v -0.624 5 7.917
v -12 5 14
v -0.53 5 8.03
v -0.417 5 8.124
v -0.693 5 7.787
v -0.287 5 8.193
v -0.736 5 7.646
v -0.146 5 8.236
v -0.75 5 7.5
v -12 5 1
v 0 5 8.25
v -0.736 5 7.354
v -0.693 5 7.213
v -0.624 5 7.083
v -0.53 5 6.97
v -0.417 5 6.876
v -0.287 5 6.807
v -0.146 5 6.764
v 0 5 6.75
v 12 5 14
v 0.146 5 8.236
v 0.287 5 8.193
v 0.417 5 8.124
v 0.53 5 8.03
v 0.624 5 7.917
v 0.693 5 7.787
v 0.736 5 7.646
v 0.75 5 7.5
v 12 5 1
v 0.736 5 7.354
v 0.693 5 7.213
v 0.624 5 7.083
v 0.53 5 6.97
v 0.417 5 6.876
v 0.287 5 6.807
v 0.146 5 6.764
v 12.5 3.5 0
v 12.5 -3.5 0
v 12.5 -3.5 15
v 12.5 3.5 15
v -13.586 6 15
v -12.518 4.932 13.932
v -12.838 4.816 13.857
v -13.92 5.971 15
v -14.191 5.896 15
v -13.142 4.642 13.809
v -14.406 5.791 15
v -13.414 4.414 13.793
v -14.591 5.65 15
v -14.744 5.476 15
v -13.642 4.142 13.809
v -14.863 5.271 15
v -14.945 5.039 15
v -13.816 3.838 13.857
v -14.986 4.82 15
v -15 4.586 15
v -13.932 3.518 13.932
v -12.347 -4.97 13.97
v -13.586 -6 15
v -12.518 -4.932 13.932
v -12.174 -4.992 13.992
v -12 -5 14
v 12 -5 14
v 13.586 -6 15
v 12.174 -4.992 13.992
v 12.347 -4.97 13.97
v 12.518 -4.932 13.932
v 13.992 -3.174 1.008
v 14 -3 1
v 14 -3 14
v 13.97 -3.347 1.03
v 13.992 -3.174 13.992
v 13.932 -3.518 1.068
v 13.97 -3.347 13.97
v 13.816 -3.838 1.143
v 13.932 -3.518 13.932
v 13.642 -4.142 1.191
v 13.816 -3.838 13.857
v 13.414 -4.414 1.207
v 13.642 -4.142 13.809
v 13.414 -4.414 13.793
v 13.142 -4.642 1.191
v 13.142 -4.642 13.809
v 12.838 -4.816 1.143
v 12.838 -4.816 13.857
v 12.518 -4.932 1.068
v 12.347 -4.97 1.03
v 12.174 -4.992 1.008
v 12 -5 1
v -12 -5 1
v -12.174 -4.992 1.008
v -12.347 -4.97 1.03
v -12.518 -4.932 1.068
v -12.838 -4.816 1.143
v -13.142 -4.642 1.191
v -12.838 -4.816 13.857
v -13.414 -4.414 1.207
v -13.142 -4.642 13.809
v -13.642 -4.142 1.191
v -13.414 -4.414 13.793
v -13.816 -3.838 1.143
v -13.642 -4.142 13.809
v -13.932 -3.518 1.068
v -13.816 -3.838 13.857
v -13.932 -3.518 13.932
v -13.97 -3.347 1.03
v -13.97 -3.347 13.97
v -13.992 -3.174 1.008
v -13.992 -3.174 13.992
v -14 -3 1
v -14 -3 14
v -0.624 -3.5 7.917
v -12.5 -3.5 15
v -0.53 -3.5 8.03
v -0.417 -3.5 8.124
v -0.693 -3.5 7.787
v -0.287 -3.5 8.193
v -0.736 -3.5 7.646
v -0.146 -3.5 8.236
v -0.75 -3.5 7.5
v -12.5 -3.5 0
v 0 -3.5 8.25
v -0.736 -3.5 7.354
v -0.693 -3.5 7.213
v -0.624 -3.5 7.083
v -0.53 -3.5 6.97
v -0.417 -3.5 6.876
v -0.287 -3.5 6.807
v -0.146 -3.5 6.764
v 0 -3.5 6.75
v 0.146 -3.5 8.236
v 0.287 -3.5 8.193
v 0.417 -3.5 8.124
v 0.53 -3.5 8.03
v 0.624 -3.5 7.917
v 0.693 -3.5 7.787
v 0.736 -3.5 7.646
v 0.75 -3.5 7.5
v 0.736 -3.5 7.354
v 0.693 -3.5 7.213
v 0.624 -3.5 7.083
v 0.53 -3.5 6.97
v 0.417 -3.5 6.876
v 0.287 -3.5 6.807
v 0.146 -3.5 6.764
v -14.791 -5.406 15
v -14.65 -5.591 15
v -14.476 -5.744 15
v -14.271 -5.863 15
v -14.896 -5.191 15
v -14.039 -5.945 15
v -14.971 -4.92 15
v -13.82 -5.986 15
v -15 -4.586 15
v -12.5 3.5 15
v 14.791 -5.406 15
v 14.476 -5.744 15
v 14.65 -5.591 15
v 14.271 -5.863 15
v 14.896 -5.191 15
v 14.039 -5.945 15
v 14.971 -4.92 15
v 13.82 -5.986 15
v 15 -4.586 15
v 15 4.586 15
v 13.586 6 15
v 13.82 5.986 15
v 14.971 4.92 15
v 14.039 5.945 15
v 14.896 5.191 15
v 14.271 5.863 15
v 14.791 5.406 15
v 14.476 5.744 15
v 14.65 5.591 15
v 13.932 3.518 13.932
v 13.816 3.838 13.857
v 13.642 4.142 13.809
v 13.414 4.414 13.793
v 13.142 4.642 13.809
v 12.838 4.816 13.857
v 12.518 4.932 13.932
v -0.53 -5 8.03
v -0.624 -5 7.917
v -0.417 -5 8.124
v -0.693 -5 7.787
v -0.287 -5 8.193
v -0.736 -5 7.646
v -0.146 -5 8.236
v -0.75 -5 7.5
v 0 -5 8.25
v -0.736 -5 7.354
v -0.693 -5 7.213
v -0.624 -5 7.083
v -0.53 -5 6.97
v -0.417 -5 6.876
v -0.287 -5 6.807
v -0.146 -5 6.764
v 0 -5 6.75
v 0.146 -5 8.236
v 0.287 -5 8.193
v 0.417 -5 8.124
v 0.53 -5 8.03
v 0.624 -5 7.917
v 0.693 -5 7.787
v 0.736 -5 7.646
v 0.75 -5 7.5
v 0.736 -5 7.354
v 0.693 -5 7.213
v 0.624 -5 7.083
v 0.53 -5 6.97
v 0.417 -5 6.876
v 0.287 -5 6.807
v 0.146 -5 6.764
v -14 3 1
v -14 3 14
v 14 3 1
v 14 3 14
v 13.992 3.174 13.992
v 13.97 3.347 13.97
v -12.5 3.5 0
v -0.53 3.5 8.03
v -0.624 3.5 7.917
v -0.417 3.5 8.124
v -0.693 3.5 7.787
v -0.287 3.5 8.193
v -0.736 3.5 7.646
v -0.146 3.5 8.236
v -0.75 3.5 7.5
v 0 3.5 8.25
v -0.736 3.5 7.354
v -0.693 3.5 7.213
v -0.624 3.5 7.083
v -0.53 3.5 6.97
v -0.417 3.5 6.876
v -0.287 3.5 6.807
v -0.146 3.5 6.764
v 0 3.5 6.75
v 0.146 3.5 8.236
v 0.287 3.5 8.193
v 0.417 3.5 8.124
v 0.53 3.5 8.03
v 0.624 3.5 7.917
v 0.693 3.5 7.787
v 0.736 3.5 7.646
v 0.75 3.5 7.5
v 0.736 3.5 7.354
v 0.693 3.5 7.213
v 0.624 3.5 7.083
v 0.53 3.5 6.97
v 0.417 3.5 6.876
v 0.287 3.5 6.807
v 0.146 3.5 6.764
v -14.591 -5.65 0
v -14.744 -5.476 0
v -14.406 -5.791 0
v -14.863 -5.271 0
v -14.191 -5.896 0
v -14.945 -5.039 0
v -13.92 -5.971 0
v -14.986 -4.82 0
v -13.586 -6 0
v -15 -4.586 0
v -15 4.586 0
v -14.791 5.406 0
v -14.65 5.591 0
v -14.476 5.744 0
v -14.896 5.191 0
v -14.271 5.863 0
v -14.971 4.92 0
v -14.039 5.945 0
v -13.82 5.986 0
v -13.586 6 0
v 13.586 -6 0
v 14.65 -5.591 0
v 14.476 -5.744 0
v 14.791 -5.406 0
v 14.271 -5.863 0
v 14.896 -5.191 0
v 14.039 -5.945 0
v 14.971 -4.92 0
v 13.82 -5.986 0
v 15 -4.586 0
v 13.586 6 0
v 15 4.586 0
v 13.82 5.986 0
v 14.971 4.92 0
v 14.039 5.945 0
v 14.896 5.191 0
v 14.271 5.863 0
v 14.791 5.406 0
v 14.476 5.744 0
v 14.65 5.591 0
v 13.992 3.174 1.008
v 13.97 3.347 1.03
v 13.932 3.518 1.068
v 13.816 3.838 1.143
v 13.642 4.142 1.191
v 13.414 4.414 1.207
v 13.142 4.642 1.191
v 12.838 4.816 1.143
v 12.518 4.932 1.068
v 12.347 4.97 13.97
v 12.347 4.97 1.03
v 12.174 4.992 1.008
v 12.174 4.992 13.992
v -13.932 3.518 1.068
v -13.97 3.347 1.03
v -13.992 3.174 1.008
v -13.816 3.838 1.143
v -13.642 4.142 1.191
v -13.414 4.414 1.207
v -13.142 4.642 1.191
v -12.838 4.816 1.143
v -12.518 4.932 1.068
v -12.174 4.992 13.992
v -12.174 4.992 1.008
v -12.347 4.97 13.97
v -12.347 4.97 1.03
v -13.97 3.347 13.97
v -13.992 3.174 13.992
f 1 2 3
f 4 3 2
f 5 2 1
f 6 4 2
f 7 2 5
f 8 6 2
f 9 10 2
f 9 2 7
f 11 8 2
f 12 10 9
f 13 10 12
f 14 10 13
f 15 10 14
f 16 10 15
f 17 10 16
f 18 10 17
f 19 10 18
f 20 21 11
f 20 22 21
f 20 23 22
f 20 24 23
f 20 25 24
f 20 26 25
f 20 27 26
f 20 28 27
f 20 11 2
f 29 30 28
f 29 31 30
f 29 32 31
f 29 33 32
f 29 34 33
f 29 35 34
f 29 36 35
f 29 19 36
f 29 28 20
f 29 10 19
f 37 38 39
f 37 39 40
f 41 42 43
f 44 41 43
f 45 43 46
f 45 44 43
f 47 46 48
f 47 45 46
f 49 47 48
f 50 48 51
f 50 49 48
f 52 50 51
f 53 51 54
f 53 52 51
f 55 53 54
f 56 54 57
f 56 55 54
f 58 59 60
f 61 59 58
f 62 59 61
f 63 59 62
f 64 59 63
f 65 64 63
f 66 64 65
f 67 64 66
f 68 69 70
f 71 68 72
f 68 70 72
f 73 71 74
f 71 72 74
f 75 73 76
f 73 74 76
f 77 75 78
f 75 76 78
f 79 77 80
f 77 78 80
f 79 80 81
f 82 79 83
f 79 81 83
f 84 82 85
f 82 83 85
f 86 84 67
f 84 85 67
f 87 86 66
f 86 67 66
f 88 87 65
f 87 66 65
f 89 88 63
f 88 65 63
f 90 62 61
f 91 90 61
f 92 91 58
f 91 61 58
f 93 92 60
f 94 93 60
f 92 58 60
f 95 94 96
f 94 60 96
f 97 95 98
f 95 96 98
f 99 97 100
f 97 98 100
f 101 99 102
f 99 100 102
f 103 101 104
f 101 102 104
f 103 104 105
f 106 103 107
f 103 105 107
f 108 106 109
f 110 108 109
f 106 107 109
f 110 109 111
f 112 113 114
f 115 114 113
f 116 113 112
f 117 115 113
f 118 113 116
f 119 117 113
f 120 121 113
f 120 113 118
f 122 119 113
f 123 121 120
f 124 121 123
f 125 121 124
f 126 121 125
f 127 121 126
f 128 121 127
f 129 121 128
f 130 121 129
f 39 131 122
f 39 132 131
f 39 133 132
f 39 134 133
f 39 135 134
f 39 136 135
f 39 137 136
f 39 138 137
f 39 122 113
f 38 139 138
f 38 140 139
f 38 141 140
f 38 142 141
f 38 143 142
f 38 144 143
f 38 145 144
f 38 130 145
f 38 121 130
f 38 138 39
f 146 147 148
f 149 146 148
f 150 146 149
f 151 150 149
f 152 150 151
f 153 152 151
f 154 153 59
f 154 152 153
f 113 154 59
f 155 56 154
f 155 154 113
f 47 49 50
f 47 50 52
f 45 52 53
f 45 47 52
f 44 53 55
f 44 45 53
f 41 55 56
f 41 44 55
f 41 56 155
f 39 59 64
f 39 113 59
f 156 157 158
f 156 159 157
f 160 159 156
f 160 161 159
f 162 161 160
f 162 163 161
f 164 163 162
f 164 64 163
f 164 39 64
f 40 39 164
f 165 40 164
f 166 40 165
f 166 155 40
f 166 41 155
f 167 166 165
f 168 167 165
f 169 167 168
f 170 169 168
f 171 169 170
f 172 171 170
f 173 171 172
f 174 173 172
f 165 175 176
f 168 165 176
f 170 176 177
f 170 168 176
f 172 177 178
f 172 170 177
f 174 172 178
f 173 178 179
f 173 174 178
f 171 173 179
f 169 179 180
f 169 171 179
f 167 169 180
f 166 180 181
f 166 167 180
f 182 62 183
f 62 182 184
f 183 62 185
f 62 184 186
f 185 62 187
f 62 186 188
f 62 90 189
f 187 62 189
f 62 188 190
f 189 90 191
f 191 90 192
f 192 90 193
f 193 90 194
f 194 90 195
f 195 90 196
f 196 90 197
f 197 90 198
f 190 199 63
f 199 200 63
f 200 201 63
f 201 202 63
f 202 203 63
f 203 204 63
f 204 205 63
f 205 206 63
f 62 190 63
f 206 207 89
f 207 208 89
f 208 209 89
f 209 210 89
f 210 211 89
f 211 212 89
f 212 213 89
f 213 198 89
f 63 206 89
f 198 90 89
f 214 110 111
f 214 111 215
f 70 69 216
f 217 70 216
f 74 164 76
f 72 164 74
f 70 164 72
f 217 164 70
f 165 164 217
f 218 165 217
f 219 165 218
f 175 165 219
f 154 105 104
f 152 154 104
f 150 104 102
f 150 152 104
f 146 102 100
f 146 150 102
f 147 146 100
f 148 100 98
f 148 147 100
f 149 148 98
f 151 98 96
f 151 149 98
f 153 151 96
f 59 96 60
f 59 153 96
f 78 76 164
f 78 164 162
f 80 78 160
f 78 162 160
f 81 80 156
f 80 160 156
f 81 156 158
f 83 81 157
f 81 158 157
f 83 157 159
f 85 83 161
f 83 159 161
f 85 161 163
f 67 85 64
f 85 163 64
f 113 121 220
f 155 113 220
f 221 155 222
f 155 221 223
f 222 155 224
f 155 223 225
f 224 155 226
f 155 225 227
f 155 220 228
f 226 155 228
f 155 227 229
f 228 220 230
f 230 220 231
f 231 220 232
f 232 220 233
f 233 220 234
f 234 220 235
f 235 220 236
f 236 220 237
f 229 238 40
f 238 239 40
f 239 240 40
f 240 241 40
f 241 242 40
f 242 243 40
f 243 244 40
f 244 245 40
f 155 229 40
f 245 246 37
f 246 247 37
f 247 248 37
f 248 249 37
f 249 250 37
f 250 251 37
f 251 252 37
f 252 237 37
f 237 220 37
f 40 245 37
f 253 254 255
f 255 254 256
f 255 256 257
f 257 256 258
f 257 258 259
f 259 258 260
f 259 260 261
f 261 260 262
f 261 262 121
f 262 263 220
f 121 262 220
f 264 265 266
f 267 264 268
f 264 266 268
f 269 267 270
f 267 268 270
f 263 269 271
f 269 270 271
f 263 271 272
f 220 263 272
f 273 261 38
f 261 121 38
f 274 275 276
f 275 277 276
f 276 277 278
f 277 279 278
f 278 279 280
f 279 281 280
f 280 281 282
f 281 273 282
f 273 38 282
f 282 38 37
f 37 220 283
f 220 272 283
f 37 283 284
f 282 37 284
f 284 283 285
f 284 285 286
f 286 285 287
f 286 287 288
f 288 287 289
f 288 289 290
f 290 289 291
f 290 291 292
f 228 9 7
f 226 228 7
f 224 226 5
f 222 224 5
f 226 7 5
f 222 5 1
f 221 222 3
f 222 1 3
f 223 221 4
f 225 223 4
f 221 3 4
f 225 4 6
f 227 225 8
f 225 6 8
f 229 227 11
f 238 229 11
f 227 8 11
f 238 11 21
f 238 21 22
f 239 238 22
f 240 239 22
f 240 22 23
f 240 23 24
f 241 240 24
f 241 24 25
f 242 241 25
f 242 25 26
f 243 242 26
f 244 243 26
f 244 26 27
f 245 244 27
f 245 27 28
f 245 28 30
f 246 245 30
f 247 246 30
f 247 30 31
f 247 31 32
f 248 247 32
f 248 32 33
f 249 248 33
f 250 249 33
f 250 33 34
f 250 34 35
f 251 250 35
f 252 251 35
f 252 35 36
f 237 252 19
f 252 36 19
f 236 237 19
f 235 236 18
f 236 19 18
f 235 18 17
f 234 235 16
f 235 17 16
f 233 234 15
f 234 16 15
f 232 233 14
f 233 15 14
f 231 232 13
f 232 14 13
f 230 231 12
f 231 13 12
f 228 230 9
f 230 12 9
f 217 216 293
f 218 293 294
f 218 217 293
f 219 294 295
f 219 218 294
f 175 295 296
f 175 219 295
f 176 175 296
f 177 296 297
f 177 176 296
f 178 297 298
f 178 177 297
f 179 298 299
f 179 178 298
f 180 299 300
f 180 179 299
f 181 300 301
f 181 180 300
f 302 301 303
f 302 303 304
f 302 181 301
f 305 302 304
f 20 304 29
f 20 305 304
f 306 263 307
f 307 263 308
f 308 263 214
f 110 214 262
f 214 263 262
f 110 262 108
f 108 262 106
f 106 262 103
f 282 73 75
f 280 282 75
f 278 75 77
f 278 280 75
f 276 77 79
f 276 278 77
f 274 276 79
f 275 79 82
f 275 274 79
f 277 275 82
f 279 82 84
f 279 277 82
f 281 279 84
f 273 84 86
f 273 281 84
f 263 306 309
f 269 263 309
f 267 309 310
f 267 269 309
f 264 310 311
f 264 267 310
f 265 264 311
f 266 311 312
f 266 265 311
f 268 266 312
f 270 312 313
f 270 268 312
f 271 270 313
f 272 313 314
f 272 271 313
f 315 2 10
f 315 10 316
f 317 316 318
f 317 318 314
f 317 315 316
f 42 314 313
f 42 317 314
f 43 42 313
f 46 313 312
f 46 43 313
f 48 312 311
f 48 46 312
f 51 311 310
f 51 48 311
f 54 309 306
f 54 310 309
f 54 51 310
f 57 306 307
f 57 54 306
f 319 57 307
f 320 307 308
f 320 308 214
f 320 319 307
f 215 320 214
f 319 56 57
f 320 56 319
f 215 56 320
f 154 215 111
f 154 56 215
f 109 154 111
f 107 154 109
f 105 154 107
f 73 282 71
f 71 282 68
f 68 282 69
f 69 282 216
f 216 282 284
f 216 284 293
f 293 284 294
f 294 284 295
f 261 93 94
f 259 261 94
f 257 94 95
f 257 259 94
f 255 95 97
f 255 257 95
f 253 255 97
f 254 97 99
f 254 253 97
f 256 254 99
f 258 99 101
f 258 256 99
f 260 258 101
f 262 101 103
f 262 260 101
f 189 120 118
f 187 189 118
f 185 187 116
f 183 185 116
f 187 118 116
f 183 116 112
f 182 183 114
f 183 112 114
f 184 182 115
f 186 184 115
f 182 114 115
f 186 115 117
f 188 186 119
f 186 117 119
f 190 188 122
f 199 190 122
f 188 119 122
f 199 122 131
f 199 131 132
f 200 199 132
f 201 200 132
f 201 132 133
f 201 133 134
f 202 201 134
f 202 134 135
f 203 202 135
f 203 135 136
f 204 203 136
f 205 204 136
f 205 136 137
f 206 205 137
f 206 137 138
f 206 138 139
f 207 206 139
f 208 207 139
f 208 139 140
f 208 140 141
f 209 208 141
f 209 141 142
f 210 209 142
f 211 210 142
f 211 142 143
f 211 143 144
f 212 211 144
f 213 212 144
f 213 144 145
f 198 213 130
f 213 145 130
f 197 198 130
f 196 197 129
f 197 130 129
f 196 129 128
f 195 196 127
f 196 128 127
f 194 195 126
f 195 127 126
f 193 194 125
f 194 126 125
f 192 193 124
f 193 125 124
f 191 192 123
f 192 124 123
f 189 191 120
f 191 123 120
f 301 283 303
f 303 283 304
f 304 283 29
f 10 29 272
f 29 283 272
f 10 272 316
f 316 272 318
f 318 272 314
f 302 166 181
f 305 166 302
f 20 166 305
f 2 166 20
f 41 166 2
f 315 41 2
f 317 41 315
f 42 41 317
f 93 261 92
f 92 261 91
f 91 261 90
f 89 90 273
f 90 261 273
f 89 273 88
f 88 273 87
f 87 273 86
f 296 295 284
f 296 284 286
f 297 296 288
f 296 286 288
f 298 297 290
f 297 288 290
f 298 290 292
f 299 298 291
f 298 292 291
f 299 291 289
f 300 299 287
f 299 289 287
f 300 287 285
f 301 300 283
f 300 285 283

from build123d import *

# Parameters (mm, degrees)
F0_W     = 28
F0_H     = 10
F0_W_2   = 25
F0_H_2   = 7
F1_DEPTH = 15
F2_R     = 0.75
F3_DEPTH = 10.001
F6_F1_R  = 2
F6_F2_R  = 2
F6_F3_R  = 2
F6_F4_R  = 2
F6_F5_R  = 2
F6_F6_R  = 2
F6_F7_R  = 2
F6_F8_R  = 2
F6_F9_R  = 2
F6_F10_R = 2
F6_F11_R = 2
F6_F12_R = 2


# Not quite as in the source:
# - a feature of the source that left no trace in its solid (it failed there, or was rolled back) is left out
# - a pattern or mirror of a feature is missing from the dataset's text; its kind, count and spacing are read off the source's solid


with BuildPart() as f1:
    # F0 (on Top) → F1 (new body)
    with BuildSketch(Plane.XY):
        Rectangle(F0_W, F0_H)
        Rectangle(F0_W_2, F0_H_2, mode=Mode.SUBTRACT)
    extrude(amount=F1_DEPTH)

    # F2 (on face) → F3 (cut, through all)
    with BuildSketch(Plane(origin=(0, 5, 0), x_dir=(-1, 0, 0), z_dir=(0, 1, 0))):
        with Locations((0, 7.5)):
            Circle(F2_R)
    extrude(amount=-F3_DEPTH, mode=Mode.SUBTRACT)

    # F4: sweep along a path in F4_path
    with BuildLine(Plane(origin=(14, -5, 15), x_dir=(0, -1, 0), z_dir=(0, 0, -1))) as f4_path:
        Line((0, 0), (-10, 0))
        Line((-10, 0), (-10, 28))
        Line((-10, 28), (0, 28))
        Line((0, 28), (0, 0))
    # F2 (on face) → F4 (sweep)
    with BuildSketch(Plane(origin=(0, 5, 0), x_dir=(-1, 0, 0), z_dir=(0, 1, 0))):
        Polygon((-14, 14), (-14, 15), (-15, 15), align=None)
    f4 = sweep(path=f4_path.line, transition=Transition.RIGHT)

    # F4_copies: F4 across plane
    add(f4.mirror(Plane(origin=(0, 0, 7.5), x_dir=(-1, 0, 0), z_dir=(0, 0, -1))))

    # F6: fillet of radius 2 on 12 edges, made by hand

    # F6_f1
    f6_f1_edges = [f1.edges().sort_by_distance(p)[0] for p in [
        (14, 5, 7.5),
    ]]
    fillet(f6_f1_edges, radius=F6_F1_R)

    # F6_f2
    f6_f2_edges = [f1.edges().sort_by_distance(p)[0] for p in [
        (14, -5, 7.5),
    ]]
    fillet(f6_f2_edges, radius=F6_F2_R)

    # F6_f3
    f6_f3_edges = [f1.edges().sort_by_distance(p)[0] for p in [
        (14.2071067812, -5.2071067812, 0.7928932188),
    ]]
    fillet(f6_f3_edges, radius=F6_F3_R)

    # F6_f4
    f6_f4_edges = [f1.edges().sort_by_distance(p)[0] for p in [
        (14.2071067812, 5.2071067812, 0.7928932188),
    ]]
    fillet(f6_f4_edges, radius=F6_F4_R)

    # F6_f5
    f6_f5_edges = [f1.edges().sort_by_distance(p)[0] for p in [
        (-14, 5, 7.5),
    ]]
    fillet(f6_f5_edges, radius=F6_F5_R)

    # F6_f6
    f6_f6_edges = [f1.edges().sort_by_distance(p)[0] for p in [
        (14.2071067812, -5.2071067812, 14.2071067812),
    ]]
    fillet(f6_f6_edges, radius=F6_F6_R)

    # F6_f7
    f6_f7_edges = [f1.edges().sort_by_distance(p)[0] for p in [
        (14.2071067812, 5.2071067812, 14.2071067812),
    ]]
    fillet(f6_f7_edges, radius=F6_F7_R)

    # F6_f8
    f6_f8_edges = [f1.edges().sort_by_distance(p)[0] for p in [
        (-14, -5, 7.5),
    ]]
    fillet(f6_f8_edges, radius=F6_F8_R)

    # F6_f9
    f6_f9_edges = [f1.edges().sort_by_distance(p)[0] for p in [
        (-14.2071067812, -5.2071067812, 0.7928932188),
    ]]
    fillet(f6_f9_edges, radius=F6_F9_R)

    # F6_f10
    f6_f10_edges = [f1.edges().sort_by_distance(p)[0] for p in [
        (-14.2071067812, 5.2071067812, 0.7928932188),
    ]]
    fillet(f6_f10_edges, radius=F6_F10_R)

    # F6_f11
    f6_f11_edges = [f1.edges().sort_by_distance(p)[0] for p in [
        (-14.2071067812, 5.2071067812, 14.2071067812),
    ]]
    fillet(f6_f11_edges, radius=F6_F11_R)

    # F6_f12
    f6_f12_edges = [f1.edges().sort_by_distance(p)[0] for p in [
        (-14.2071067812, -5.2071067812, 14.2071067812),
    ]]
    fillet(f6_f12_edges, radius=F6_F12_R)


solid = f1.part
